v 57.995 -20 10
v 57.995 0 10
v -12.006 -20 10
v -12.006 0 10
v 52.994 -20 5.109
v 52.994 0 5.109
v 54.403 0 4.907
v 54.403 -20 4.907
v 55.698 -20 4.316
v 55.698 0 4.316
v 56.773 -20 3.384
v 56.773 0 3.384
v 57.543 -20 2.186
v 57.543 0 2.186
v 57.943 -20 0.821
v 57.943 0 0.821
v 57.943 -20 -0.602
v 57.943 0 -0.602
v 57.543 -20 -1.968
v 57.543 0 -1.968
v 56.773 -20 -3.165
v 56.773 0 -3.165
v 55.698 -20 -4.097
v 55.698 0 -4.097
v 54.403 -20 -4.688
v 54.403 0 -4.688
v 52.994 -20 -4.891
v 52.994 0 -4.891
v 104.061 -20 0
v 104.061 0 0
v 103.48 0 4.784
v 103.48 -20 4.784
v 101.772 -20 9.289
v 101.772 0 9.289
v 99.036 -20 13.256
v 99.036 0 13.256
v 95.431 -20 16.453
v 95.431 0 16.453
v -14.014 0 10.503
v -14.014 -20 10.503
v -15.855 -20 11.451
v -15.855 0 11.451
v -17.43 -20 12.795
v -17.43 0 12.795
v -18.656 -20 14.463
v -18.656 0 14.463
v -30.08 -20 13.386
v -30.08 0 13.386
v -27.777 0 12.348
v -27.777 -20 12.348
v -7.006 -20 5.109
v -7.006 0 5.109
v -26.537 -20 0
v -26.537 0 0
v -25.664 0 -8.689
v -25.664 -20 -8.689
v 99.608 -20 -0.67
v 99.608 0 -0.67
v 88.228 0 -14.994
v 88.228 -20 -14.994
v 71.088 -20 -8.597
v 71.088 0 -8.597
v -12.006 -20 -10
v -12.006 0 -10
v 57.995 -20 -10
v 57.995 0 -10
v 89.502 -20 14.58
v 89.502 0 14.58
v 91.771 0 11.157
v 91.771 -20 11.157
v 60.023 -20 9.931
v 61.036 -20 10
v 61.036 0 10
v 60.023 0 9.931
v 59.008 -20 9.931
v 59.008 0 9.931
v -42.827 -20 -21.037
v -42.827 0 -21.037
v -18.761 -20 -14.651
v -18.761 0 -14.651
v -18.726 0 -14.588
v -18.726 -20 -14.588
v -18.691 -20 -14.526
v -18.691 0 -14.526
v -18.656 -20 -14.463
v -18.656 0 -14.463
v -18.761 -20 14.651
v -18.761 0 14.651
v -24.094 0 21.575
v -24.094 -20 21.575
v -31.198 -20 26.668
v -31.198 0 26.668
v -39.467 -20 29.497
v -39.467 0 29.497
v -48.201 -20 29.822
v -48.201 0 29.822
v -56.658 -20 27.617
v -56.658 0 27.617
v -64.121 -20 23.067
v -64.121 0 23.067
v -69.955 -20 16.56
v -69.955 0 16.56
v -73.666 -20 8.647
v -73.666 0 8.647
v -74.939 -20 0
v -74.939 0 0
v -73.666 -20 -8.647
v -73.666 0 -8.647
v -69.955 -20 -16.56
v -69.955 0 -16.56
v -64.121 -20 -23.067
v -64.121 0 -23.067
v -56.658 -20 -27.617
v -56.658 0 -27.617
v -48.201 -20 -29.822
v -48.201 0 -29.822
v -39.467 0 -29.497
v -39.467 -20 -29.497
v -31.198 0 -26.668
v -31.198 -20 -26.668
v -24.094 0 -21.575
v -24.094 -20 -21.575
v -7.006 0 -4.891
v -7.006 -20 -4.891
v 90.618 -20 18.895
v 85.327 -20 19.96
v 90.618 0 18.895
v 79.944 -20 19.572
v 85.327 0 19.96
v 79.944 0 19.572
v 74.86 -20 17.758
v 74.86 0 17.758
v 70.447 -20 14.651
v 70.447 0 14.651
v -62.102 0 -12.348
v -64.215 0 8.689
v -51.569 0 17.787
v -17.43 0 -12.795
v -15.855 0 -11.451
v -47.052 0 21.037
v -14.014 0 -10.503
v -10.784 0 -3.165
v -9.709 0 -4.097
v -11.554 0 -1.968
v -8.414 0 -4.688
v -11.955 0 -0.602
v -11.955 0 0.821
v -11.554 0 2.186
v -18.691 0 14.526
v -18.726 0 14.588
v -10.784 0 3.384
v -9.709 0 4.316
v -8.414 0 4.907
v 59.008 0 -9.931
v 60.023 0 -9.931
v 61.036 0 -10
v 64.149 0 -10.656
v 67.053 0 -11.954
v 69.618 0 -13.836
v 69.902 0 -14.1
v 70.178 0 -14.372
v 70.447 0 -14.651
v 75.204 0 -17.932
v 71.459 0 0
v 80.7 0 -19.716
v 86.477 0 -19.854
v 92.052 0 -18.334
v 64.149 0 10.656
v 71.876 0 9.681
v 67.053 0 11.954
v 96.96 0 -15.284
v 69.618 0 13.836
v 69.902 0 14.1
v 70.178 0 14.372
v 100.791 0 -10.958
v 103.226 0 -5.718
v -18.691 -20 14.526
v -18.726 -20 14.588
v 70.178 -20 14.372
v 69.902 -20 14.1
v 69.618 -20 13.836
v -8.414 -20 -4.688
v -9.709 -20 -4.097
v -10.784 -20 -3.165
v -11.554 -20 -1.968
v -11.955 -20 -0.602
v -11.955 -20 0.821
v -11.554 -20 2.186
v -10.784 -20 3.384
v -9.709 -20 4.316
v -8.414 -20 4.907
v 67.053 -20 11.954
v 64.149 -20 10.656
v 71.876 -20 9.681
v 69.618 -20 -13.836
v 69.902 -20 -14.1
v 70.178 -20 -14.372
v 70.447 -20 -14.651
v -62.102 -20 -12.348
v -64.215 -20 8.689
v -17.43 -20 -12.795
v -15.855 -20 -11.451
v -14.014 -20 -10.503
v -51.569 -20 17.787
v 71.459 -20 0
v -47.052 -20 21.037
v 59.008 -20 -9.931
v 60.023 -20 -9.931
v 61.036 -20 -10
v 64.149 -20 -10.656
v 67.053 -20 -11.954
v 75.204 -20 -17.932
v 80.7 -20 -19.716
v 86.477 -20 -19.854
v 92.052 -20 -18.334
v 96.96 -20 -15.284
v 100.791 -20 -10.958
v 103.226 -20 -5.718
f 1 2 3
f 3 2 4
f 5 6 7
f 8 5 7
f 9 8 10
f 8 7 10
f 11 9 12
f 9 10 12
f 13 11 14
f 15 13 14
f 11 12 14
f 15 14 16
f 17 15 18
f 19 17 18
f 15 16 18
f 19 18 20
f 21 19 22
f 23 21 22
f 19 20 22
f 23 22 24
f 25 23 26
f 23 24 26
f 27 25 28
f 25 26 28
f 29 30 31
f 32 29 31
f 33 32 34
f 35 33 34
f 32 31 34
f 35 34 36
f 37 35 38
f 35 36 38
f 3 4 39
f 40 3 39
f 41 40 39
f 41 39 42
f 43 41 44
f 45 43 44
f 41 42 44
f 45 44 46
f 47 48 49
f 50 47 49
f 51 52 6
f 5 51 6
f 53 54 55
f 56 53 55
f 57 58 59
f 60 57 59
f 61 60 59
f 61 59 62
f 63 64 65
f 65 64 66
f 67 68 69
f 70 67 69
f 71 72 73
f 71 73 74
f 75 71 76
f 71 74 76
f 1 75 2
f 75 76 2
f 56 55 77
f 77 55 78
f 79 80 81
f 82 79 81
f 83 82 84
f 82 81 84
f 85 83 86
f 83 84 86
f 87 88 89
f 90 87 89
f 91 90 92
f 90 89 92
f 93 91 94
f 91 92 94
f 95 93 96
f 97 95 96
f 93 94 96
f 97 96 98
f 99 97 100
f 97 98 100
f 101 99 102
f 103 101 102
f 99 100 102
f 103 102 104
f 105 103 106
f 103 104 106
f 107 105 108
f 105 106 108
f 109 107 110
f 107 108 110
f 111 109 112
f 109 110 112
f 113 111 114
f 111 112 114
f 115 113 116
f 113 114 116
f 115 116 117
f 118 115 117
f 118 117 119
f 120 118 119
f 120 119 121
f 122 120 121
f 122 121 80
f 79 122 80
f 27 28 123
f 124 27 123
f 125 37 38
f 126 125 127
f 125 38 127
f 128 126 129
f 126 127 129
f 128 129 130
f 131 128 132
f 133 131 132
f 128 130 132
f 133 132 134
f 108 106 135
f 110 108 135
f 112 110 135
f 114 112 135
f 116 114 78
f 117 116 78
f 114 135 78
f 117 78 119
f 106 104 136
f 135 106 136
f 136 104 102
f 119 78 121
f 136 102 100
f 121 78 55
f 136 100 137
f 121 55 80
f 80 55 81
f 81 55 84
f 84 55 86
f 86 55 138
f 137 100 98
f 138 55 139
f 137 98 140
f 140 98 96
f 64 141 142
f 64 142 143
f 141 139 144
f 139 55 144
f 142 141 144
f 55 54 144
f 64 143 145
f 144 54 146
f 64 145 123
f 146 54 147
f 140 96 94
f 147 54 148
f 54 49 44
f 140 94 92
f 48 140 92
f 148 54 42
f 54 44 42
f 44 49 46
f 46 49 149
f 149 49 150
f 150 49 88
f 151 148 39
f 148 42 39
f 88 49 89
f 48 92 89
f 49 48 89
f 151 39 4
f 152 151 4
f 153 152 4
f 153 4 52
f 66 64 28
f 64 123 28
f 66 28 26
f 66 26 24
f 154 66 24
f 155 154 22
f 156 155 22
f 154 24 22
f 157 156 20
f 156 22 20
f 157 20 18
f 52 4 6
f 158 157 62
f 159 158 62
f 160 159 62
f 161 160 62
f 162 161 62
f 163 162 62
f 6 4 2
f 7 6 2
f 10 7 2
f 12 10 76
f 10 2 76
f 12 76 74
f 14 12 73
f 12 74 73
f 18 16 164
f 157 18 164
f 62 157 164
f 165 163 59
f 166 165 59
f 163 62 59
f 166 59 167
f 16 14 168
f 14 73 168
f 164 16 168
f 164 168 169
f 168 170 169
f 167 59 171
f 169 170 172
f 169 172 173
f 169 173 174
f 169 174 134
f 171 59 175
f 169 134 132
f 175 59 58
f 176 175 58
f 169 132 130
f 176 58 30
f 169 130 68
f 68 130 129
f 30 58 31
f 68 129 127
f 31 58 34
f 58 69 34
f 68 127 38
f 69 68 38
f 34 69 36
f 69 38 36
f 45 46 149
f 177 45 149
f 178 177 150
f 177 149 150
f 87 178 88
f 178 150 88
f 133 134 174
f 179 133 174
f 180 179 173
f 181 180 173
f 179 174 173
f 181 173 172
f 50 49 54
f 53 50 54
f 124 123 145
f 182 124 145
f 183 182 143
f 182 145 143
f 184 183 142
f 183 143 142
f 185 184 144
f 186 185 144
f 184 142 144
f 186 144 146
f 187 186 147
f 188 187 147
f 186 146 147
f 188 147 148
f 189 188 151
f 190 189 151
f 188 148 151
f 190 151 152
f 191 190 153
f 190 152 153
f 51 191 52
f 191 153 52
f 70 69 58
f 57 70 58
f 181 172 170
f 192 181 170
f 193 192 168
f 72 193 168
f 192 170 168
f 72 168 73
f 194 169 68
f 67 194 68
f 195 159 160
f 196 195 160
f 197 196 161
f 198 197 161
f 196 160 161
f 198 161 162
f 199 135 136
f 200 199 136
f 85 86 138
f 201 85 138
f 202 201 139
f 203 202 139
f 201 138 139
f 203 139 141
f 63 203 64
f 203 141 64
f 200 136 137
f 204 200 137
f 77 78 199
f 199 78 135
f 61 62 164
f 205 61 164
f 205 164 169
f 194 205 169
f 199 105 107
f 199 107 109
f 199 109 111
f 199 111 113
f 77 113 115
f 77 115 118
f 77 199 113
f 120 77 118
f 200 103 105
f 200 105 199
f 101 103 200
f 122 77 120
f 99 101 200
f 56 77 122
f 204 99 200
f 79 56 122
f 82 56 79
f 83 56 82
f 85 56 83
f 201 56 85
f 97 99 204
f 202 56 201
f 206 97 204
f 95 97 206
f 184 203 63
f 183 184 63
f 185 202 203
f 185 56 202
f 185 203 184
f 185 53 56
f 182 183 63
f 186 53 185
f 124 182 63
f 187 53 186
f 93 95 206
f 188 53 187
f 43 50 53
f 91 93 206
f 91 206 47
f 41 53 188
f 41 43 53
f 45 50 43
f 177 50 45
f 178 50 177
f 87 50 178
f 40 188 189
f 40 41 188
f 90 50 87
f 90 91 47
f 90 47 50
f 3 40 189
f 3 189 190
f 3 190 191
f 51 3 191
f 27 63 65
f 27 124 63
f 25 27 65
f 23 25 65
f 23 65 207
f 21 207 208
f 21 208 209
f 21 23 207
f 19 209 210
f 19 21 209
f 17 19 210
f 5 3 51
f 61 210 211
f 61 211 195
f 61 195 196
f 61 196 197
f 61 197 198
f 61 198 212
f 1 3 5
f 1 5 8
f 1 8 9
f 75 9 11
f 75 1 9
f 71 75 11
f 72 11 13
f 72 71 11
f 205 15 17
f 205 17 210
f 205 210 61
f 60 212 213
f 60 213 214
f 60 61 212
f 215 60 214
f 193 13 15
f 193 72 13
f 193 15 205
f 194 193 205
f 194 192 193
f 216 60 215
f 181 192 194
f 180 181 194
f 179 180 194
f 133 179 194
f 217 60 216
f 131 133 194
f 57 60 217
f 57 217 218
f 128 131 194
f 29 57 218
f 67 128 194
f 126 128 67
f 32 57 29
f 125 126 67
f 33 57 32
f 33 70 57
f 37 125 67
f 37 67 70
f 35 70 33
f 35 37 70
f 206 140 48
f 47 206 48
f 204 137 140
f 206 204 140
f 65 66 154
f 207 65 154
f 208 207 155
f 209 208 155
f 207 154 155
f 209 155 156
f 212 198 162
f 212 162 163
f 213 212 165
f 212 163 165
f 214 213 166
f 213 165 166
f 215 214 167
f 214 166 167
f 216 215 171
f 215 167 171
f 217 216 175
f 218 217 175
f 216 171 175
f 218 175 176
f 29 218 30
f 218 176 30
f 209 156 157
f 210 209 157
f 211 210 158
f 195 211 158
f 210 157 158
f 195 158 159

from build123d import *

# Parameters (mm, degrees)
F1_DEPTH = 20


with BuildPart() as f1:
    # F0 (on Front) → F1 (new body)
    with BuildSketch(Plane.XZ):
        with BuildLine():
            ThreePointArc((-18.656017, 14.463057), (-18.708848, 14.556927), (-18.760553, 14.651424))
            ThreePointArc((-18.760553, 14.651424), (-74.939471, 0), (-18.760553, -14.651424))
            ThreePointArc((-18.760553, -14.651424), (-18.708848, -14.556927), (-18.656017, -14.463057))
            ThreePointArc((-18.656017, -14.463057), (-15.883459, -7.46647), (-14.939471, 0))
            ThreePointArc((-14.939471, 0), (-15.883459, 7.46647), (-18.656017, 14.463057))
        make_face()
        Polygon((-51.569248, 17.787172), (-47.052302, 21.037134), (-30.079958, 13.386369), (-27.777194, 12.348333), (-26.537009, 0), (-25.664363, -8.688802), (-42.82664, -21.037134), (-62.101748, -12.348333), (-64.21458, 8.688802), align=None, mode=Mode.SUBTRACT)
        with BuildLine():
            ThreePointArc((70.44672, 14.651424), (70.040505, 14.235547), (69.618481, 13.835724))
            ThreePointArc((69.618481, 13.835724), (64.060529, 0), (69.618481, -13.835724))
            ThreePointArc((69.618481, -13.835724), (70.040505, -14.235547), (70.44672, -14.651424))
            ThreePointArc((70.44672, -14.651424), (92.051894, -18.334069), (104.060529, 0))
            ThreePointArc((104.060529, 0), (101.772313, 9.289387), (95.431258, 16.453161))
            ThreePointArc((95.431258, 16.453161), (82.621982, 19.948198), (70.44672, 14.651424))
        make_face()
        Polygon((89.50246, 14.579673), (91.770843, 11.156633), (99.608271, -0.670217), (88.227631, -14.99389), (71.088197, -8.596516), (71.458768, 0), (71.876085, 9.680951), align=None, mode=Mode.SUBTRACT)
        with BuildLine():
            ThreePointArc((-12.005609, 10), (-15.854632, 11.450985), (-18.656017, 14.463057))
            ThreePointArc((-18.656017, 14.463057), (-15.883459, 7.46647), (-14.939471, 0))
            ThreePointArc((-14.939471, 0), (-15.883459, -7.46647), (-18.656017, -14.463057))
            ThreePointArc((-18.656017, -14.463057), (-15.854632, -11.450985), (-12.005609, -10))
            Line((-12.005609, -10), (57.99466, -10))
            ThreePointArc((57.99466, -10), (59.515113, -9.922742), (61.035567, -10))
            ThreePointArc((61.035567, -10), (65.635285, -11.228089), (69.618481, -13.835724))
            ThreePointArc((69.618481, -13.835724), (64.060529, 0), (69.618481, 13.835724))
            ThreePointArc((69.618481, 13.835724), (65.635285, 11.228089), (61.035567, 10))
            ThreePointArc((61.035567, 10), (59.515113, 9.922742), (57.99466, 10))
            Line((57.99466, 10), (-12.005609, 10))
        make_face()
        with BuildLine():
            ThreePointArc((-7.005609, -4.890676), (-12.005609, 0.109324), (-7.005609, 5.109324))
            Line((-7.005609, 5.109324), (52.994391, 5.109324))
            ThreePointArc((52.994391, 5.109324), (57.994391, 0.109324), (52.994391, -4.890676))
            Line((52.994391, -4.890676), (-7.005609, -4.890676))
        make_face(mode=Mode.SUBTRACT)
    extrude(amount=F1_DEPTH)


solid = f1.part
